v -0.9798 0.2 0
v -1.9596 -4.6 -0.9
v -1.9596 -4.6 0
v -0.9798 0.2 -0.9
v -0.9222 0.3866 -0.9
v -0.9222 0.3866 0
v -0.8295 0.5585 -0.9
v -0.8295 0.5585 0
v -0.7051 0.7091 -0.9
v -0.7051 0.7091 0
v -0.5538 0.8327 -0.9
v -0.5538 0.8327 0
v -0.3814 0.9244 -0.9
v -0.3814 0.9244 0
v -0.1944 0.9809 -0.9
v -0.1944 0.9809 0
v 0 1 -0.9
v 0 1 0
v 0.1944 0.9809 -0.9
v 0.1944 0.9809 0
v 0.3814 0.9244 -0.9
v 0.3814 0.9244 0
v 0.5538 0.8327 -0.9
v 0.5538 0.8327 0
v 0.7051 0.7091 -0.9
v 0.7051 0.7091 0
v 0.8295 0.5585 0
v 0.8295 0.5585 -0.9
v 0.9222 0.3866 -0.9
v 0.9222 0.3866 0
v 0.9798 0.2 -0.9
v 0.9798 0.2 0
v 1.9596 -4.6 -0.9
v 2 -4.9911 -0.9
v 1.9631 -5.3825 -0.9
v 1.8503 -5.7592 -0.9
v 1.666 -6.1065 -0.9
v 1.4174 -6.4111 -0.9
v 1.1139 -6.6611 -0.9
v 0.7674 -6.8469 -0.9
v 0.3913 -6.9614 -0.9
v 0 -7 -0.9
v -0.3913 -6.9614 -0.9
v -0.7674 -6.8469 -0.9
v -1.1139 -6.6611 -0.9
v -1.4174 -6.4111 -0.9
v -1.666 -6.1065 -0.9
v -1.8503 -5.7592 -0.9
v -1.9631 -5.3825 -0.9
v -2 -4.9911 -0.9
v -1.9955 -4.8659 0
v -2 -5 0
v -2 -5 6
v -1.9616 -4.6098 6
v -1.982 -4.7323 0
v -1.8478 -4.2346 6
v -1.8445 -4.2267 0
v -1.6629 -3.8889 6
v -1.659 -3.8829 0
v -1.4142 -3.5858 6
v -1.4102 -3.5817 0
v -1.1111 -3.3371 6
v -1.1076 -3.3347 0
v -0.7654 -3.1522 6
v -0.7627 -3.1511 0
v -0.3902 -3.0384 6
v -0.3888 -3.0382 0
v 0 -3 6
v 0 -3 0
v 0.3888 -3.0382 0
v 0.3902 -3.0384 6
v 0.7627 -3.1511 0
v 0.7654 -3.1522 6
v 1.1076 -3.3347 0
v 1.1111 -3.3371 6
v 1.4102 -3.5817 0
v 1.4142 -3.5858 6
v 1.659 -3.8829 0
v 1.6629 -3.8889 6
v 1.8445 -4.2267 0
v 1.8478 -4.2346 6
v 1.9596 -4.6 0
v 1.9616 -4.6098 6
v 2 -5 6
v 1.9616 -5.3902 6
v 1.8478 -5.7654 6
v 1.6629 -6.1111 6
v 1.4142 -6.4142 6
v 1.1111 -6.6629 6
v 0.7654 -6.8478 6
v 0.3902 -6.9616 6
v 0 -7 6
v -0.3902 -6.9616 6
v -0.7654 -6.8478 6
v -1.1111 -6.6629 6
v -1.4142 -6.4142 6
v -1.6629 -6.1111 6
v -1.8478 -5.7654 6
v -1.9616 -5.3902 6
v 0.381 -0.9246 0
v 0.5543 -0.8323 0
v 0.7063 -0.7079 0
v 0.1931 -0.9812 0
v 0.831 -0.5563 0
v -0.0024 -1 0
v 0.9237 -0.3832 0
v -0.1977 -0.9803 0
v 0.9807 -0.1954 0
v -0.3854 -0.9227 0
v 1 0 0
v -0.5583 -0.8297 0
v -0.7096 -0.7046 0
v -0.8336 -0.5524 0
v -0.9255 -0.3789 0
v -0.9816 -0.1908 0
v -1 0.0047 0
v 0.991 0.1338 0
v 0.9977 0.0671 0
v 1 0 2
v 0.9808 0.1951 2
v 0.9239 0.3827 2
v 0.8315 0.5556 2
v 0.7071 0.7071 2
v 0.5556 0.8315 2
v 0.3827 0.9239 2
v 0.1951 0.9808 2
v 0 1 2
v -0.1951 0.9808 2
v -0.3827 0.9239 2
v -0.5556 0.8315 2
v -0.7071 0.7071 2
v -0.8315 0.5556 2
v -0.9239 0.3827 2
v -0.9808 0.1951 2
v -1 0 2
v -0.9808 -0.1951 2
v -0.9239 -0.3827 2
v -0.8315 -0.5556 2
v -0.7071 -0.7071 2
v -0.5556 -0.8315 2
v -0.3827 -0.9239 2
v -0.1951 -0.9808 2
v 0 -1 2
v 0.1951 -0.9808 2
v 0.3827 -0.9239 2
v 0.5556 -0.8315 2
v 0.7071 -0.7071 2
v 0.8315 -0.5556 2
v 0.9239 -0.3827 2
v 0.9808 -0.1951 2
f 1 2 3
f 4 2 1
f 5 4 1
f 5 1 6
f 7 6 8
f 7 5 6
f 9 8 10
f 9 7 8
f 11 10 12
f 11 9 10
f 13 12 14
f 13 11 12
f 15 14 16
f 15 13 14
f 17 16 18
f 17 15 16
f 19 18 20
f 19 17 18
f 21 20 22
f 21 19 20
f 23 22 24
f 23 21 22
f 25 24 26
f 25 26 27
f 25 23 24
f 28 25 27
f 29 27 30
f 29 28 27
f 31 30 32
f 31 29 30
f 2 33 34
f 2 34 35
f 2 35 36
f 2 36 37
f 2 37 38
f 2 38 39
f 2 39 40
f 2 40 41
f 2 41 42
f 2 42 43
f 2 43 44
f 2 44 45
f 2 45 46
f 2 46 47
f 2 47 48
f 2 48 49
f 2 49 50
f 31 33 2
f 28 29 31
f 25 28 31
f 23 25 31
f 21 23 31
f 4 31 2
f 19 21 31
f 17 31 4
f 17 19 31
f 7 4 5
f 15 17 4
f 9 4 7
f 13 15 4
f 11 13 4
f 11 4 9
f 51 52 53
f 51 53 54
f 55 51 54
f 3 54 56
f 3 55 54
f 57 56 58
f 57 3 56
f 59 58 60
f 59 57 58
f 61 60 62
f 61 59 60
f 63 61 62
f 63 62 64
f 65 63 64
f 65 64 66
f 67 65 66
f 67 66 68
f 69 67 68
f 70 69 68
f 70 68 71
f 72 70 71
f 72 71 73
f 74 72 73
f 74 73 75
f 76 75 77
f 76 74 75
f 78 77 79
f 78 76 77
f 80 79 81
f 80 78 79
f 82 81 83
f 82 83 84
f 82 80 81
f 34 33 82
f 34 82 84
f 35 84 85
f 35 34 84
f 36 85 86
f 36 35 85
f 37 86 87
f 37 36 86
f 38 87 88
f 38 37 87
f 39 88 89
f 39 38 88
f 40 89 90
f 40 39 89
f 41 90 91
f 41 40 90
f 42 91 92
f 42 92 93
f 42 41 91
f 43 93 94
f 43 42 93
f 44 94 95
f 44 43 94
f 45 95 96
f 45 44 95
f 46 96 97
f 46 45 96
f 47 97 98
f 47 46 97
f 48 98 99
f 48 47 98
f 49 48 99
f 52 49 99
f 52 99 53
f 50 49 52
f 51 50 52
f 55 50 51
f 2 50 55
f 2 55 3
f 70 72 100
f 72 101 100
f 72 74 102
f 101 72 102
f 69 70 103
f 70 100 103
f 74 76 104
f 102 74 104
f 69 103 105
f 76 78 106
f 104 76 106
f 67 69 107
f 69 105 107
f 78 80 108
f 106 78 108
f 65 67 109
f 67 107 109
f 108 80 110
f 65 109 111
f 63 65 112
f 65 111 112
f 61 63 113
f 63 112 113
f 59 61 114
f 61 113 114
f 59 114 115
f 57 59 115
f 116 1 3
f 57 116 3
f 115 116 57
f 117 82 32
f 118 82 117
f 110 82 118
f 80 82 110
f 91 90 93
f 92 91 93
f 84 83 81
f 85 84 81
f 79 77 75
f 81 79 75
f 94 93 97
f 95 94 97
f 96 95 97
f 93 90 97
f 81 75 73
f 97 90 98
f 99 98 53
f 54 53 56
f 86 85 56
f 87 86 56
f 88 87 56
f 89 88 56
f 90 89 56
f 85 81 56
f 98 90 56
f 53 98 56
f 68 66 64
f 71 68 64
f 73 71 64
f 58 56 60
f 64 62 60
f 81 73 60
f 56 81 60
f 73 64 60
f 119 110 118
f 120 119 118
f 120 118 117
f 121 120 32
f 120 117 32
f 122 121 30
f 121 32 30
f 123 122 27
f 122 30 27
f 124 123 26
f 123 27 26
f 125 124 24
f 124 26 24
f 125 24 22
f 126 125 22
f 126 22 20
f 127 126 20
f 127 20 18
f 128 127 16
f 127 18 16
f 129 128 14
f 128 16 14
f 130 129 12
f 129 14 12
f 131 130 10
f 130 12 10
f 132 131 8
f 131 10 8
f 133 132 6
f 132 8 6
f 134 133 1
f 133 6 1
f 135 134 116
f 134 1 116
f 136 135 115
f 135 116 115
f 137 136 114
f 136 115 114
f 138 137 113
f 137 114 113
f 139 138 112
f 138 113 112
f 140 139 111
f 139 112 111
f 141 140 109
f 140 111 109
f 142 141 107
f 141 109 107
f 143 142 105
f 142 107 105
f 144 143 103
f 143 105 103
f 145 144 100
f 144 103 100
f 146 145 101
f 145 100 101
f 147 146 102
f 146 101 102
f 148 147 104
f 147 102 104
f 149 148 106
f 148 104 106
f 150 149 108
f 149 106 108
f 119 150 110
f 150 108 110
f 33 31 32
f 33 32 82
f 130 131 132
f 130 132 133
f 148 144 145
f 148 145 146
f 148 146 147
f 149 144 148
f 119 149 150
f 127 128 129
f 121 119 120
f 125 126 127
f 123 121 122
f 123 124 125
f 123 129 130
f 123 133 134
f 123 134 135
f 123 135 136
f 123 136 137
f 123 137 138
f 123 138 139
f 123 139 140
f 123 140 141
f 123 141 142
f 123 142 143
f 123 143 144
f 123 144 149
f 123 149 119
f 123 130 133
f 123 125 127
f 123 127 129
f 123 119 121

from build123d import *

# Parameters (mm, degrees)
SKETCH_1_R      = 1
EXTRUDE_1_DEPTH = 2
SKETCH_2_R      = 2
EXTRUDE_2_DEPTH = 6
EXTRUDE_START   = 0.9
SKETCH_3_R      = 1
SKETCH_3_R_2    = 2
EXTRUDE_3_DEPTH = 0.9


with BuildPart() as part:
    # 스케치1 → 보스-돌출1 (new body)
    with BuildSketch(Plane.XY):
        Circle(SKETCH_1_R)
    extrude(amount=EXTRUDE_1_DEPTH)



with BuildPart() as body_2:
    # 스케치2 → 보스-돌출2 (new body)
    with BuildSketch(Plane(origin=(0, 0, 0), x_dir=(-1, 0, 0), z_dir=(0, 0, -1))):
        with Locations((0, -5)):
            Circle(SKETCH_2_R)
    extrude(amount=-EXTRUDE_2_DEPTH)


with BuildPart() as part_1:
    add(part.part)

    add(body_2.part)  # 보스-돌출3 merges body 2
    # 스케치3 → 보스-돌출3 (add)
    with BuildSketch(Plane(origin=(0, 0, 0), x_dir=(-1, 0, 0), z_dir=(0, 0, -1)).offset(EXTRUDE_START)):
        with Locations(Location((0, 0, 0), (0, 0, 11.536959033))):
            Circle(SKETCH_3_R)
        with BuildLine():
            Line((1.959591794, -4.6), (0.979795897, 0.2))
            ThreePointArc((0.979795897, 0.2), (0.994936153, 0.100508962), (1, 0))
            ThreePointArc((1, 0), (-0.100508962, -0.994936153), (-0.979795897, 0.2))
            Line((-0.979795897, 0.2), (-1.959591794, -4.6))
            ThreePointArc((-1.959591794, -4.6), (0, -3), (1.959591794, -4.6))
        make_face()
        with Locations(Location((0, -5, 0), (0, 0, 168.463040967))):
            Circle(SKETCH_3_R_2)
    extrude(amount=-EXTRUDE_3_DEPTH)


solid = part_1.part
